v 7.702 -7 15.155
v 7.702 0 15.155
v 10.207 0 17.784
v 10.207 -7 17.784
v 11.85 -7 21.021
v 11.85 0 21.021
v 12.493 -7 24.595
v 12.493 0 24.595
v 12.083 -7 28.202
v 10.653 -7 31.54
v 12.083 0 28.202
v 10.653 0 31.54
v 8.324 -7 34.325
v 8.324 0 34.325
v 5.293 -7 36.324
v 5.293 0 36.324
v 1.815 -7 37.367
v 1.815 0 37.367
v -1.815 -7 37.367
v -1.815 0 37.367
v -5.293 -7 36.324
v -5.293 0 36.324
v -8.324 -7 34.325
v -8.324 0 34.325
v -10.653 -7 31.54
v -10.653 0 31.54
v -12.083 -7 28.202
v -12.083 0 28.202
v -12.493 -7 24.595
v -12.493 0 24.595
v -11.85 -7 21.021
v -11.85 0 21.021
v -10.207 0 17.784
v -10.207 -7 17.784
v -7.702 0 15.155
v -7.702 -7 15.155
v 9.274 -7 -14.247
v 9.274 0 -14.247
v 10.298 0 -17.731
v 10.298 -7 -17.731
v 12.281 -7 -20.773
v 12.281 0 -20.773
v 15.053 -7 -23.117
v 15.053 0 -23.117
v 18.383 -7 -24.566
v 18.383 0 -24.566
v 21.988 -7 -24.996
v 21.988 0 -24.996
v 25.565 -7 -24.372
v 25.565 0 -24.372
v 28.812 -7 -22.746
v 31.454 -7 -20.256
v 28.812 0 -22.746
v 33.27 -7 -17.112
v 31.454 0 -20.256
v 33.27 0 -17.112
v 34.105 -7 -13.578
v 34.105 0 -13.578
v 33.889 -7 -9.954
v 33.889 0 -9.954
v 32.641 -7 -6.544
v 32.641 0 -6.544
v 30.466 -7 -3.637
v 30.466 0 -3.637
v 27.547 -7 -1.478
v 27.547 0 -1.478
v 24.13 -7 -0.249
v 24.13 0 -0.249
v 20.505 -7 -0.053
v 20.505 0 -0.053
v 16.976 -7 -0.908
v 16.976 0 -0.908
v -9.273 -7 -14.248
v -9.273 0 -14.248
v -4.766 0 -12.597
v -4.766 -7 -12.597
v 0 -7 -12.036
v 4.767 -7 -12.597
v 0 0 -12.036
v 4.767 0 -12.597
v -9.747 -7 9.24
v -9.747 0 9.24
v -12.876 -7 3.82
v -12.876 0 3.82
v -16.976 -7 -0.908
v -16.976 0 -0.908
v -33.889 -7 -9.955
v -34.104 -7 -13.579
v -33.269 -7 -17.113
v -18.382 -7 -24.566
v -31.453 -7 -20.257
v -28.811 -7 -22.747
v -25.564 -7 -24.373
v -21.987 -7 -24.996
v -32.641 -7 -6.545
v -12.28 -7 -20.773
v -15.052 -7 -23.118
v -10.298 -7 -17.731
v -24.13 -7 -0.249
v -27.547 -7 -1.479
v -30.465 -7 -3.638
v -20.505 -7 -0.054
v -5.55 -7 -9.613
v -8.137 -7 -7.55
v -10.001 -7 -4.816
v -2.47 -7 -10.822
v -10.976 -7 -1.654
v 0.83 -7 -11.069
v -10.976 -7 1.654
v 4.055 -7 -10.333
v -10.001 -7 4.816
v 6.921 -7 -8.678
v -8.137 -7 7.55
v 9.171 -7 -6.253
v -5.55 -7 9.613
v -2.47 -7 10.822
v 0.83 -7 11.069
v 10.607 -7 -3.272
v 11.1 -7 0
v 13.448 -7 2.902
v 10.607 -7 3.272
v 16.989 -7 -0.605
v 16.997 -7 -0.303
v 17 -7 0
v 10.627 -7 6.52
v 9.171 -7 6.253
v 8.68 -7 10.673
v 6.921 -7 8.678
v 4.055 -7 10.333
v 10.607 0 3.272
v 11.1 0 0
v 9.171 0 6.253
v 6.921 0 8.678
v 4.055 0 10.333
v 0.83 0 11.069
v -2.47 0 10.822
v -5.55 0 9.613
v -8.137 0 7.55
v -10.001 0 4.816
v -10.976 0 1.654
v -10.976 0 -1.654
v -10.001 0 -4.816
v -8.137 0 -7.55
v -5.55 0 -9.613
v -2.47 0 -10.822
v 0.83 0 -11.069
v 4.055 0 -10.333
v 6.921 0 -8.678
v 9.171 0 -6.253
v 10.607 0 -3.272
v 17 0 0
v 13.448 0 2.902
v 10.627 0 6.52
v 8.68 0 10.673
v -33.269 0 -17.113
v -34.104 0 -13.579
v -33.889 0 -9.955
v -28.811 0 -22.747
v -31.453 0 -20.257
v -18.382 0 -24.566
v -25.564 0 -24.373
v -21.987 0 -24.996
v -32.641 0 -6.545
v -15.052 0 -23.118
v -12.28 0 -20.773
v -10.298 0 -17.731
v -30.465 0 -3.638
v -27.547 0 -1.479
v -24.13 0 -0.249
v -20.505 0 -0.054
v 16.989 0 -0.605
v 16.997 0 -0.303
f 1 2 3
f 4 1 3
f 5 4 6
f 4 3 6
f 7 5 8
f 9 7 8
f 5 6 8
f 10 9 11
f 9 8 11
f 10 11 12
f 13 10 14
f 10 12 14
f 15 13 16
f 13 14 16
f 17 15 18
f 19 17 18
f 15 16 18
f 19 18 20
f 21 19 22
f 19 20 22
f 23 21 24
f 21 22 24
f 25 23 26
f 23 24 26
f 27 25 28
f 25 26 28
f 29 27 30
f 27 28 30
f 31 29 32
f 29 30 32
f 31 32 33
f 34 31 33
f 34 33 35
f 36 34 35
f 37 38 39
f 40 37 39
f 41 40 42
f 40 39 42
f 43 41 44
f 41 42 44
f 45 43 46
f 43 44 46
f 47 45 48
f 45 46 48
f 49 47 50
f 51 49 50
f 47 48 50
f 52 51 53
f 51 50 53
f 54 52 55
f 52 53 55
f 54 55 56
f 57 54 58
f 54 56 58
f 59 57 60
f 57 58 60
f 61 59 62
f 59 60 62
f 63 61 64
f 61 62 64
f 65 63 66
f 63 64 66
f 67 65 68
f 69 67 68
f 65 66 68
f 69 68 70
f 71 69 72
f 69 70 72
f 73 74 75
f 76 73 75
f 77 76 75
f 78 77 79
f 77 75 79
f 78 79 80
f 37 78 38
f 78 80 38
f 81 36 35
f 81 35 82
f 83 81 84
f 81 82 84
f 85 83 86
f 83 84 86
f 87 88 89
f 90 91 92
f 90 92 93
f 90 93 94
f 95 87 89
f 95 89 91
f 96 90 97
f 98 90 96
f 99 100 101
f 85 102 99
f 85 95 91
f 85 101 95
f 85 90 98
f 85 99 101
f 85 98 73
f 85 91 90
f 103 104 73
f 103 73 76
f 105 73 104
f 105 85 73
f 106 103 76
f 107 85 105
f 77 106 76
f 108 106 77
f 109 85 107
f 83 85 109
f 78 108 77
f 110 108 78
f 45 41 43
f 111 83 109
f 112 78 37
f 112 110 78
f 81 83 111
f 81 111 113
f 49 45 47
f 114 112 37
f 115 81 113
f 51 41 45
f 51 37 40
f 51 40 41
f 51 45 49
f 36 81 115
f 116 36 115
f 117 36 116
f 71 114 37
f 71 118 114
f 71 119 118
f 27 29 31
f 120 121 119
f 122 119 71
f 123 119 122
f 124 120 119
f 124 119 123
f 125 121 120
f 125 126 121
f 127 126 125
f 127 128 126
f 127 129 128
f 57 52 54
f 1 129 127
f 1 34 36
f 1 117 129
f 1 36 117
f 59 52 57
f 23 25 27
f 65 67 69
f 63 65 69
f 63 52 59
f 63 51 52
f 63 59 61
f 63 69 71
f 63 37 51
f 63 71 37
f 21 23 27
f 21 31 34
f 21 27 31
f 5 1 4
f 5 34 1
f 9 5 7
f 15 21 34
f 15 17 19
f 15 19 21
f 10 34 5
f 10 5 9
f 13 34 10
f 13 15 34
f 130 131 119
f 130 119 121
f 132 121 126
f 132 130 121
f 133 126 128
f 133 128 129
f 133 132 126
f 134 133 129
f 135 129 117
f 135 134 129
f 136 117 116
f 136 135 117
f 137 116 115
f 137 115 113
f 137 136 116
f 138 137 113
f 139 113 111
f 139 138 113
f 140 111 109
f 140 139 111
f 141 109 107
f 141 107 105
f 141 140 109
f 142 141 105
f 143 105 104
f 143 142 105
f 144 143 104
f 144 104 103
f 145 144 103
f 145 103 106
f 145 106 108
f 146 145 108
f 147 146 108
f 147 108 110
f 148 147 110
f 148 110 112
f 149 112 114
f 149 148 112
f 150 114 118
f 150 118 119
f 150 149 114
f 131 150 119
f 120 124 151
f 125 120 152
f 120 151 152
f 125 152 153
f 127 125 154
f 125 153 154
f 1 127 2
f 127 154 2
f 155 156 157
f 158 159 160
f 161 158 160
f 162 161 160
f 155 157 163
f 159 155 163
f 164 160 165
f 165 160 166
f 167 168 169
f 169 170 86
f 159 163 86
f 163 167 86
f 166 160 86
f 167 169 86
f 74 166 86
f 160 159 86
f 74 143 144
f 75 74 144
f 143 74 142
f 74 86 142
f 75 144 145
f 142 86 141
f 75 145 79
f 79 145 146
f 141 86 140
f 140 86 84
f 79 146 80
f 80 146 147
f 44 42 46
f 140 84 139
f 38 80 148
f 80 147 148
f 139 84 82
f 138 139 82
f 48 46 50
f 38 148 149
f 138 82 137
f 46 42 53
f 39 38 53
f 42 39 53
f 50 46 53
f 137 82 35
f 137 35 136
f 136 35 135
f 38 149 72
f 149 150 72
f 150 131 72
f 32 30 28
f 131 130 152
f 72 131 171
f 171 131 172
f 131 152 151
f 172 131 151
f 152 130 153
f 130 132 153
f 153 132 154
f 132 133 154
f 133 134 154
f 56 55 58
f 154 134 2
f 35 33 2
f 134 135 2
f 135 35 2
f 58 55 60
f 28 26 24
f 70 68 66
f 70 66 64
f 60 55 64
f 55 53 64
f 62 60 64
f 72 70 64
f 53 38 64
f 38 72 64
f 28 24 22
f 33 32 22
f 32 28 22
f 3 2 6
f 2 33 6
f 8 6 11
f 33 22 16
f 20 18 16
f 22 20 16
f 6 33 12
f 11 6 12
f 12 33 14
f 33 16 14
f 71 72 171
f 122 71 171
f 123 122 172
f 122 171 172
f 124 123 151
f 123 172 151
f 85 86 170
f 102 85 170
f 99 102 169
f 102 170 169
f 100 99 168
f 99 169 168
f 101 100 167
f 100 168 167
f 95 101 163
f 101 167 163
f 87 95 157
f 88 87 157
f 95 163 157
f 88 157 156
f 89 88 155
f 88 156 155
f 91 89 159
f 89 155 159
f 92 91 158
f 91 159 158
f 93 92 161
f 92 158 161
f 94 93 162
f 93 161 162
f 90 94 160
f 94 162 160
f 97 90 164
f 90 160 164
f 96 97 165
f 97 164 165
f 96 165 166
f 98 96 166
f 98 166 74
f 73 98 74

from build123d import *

# Parameters (mm, degrees)
F0_R     = 11.1
F1_DEPTH = 7


with BuildPart() as f1:
    # F0 (on Front) → F1 (new body)
    with BuildSketch(Plane.XZ):
        with BuildLine():
            ThreePointArc((6.2338166768, 15.8158), (0, 13.9), (-6.2338166768, 15.8158))
            ThreePointArc((-6.2338166768, 15.8158), (-6.9759049464, 15.5027981403), (-7.7023356847, 15.155))
            ThreePointArc((-7.7023356847, 15.155), (-11.1819106583, 6.4554763423), (-16.9757337999, -0.9079988747))
            ThreePointArc((-16.9757337999, -0.9079988747), (-16.9137232859, -1.71054512), (-16.8137929196, -2.5092563954))
            ThreePointArc((-16.8137929196, -2.5092563954), (-12.2458770397, -6.6041942087), (-10.5506350946, -12.5))
            ThreePointArc((-10.5506350946, -12.5), (-10.557972807, -12.9035385636), (-10.5799762428, -13.3065436046))
            ThreePointArc((-10.5799762428, -13.3065436046), (-9.9377854009, -13.7927669931), (-9.2732836372, -14.2480247959))
            ThreePointArc((-9.2732836372, -14.2480247959), (0.0003631141, -12.0362492821), (9.2741432999, -14.2474652501))
            ThreePointArc((9.2741432999, -14.2474652501), (9.9382015017, -13.79246718), (10.5799762428, -13.3065436046))
            ThreePointArc((10.5799762428, -13.3065436046), (12.0377531126, -6.95), (16.8137929196, -2.5092563954))
            ThreePointArc((16.8137929196, -2.5092563954), (16.9137310645, -1.7104682038), (16.9757420575, -0.9078444785))
            ThreePointArc((16.9757420575, -0.9078444785), (16.9939344323, -0.4540842556), (17, 0))
            ThreePointArc((17, 0), (10.6273382236, 6.5199223601), (7.7023356847, 15.155))
            ThreePointArc((7.7023356847, 15.155), (6.9759049464, 15.5027981403), (6.2338166768, 15.8158))
        make_face()
        Circle(F0_R, mode=Mode.SUBTRACT)
        with BuildLine():
            ThreePointArc((6.2338166768, 15.8158), (9.8082966185, 19.8031435036), (11.1, 25))
            ThreePointArc((11.1, 25), (-5.1968564964, 34.8082966185), (-6.2338166768, 15.8158))
            ThreePointArc((-6.2338166768, 15.8158), (0, 13.9), (6.2338166768, 15.8158))
        make_face()
        with BuildLine():
            ThreePointArc((-6.2338166768, 15.8158), (-5.1968564964, 34.8082966185), (11.1, 25))
            ThreePointArc((11.1, 25), (9.8082966185, 19.8031435036), (6.2338166768, 15.8158))
            ThreePointArc((6.2338166768, 15.8158), (6.9759049464, 15.5027981403), (7.7023356847, 15.155))
            ThreePointArc((7.7023356847, 15.155), (0, 37.5), (-7.7023356847, 15.155))
            ThreePointArc((-7.7023356847, 15.155), (-6.9759049464, 15.5027981403), (-6.2338166768, 15.8158))
        make_face()
        with BuildLine():
            ThreePointArc((-16.8137929196, -2.5092563954), (-16.9137232859, -1.71054512), (-16.9757337999, -0.9079988747))
            ThreePointArc((-16.9757337999, -0.9079988747), (-32.4756988834, -18.751271821), (-9.2732836372, -14.2480247959))
            ThreePointArc((-9.2732836372, -14.2480247959), (-9.9377854009, -13.7927669931), (-10.5799762428, -13.3065436046))
            ThreePointArc((-10.5799762428, -13.3065436046), (-31.2635170766, -18.05), (-16.8137929196, -2.5092563954))
        make_face()
        with BuildLine():
            ThreePointArc((9.2741432999, -14.2474652501), (32.4767837776, -18.7503949231), (16.9757420575, -0.9078444785))
            ThreePointArc((16.9757420575, -0.9078444785), (16.9137310645, -1.7104682038), (16.8137929196, -2.5092563954))
            ThreePointArc((16.8137929196, -2.5092563954), (27.5464408859, -3.0952419451), (32.7506350946, -12.5))
            ThreePointArc((32.7506350946, -12.5), (22.0541736582, -23.5926622876), (10.5799762428, -13.3065436046))
            ThreePointArc((10.5799762428, -13.3065436046), (9.9382015017, -13.79246718), (9.2741432999, -14.2474652501))
        make_face()
        with BuildLine():
            ThreePointArc((-10.5506350946, -12.5), (-12.2458770397, -6.6041942087), (-16.8137929196, -2.5092563954))
            ThreePointArc((-16.8137929196, -2.5092563954), (-31.2635170766, -18.05), (-10.5799762428, -13.3065436046))
            ThreePointArc((-10.5799762428, -13.3065436046), (-10.557972807, -12.9035385636), (-10.5506350946, -12.5))
        make_face()
        with BuildLine():
            ThreePointArc((32.7506350946, -12.5), (27.5464408859, -3.0952419451), (16.8137929196, -2.5092563954))
            ThreePointArc((16.8137929196, -2.5092563954), (12.0377531126, -6.95), (10.5799762428, -13.3065436046))
            ThreePointArc((10.5799762428, -13.3065436046), (22.0541736582, -23.5926622876), (32.7506350946, -12.5))
        make_face()
    extrude(amount=F1_DEPTH)


solid = f1.part
